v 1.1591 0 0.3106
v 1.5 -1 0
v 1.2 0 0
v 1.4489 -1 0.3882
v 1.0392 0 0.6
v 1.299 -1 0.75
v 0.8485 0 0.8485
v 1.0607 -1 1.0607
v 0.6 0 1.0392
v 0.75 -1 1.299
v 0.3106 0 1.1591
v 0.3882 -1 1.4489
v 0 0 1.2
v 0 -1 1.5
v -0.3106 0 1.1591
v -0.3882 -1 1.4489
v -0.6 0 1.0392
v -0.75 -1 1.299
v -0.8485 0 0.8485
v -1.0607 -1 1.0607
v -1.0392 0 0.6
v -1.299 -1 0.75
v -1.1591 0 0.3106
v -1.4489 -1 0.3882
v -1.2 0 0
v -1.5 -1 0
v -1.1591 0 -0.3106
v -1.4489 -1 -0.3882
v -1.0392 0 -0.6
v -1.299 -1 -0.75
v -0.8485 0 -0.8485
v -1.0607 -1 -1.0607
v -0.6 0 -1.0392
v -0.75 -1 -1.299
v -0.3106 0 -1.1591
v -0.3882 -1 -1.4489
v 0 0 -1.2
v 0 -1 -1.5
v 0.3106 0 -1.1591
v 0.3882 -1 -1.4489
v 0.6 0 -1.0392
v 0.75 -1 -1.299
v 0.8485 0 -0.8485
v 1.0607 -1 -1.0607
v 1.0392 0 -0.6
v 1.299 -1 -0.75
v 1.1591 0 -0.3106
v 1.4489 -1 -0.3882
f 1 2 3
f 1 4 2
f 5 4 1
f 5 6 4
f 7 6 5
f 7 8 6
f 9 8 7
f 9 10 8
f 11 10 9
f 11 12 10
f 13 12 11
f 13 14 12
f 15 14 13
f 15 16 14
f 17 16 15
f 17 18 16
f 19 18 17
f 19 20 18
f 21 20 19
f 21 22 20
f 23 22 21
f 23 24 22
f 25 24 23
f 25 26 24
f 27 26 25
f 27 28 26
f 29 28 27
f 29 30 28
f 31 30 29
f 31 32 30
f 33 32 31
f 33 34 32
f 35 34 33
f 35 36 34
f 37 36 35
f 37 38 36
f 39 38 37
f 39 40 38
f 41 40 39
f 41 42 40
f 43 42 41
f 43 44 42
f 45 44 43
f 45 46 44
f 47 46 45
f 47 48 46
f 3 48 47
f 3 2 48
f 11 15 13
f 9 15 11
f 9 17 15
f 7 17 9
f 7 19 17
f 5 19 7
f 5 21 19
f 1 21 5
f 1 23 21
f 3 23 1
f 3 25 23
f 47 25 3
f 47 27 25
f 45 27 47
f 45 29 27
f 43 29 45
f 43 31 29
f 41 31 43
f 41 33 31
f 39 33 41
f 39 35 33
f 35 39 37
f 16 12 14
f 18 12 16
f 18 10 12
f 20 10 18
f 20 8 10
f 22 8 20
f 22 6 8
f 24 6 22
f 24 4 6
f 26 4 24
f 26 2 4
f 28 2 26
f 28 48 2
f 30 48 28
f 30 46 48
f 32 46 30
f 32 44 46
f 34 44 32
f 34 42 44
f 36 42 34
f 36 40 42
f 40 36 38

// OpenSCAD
// file: clip.scad
module clip(clip_size=1.5, clip_width=1) {

    rotate([90,0,0])
        cylinder(h=clip_width, r1=clip_size*.8, r2=clip_size);
        
    translate([0,-clip_width,0])
        square([clip_size*1.5, clip_width]);
    
}
// main file
// Grid Section
include <clip.scad>

$fa = 1;
$fs = 0.4;

clip(clip_size=1.5, clip_width=1);
